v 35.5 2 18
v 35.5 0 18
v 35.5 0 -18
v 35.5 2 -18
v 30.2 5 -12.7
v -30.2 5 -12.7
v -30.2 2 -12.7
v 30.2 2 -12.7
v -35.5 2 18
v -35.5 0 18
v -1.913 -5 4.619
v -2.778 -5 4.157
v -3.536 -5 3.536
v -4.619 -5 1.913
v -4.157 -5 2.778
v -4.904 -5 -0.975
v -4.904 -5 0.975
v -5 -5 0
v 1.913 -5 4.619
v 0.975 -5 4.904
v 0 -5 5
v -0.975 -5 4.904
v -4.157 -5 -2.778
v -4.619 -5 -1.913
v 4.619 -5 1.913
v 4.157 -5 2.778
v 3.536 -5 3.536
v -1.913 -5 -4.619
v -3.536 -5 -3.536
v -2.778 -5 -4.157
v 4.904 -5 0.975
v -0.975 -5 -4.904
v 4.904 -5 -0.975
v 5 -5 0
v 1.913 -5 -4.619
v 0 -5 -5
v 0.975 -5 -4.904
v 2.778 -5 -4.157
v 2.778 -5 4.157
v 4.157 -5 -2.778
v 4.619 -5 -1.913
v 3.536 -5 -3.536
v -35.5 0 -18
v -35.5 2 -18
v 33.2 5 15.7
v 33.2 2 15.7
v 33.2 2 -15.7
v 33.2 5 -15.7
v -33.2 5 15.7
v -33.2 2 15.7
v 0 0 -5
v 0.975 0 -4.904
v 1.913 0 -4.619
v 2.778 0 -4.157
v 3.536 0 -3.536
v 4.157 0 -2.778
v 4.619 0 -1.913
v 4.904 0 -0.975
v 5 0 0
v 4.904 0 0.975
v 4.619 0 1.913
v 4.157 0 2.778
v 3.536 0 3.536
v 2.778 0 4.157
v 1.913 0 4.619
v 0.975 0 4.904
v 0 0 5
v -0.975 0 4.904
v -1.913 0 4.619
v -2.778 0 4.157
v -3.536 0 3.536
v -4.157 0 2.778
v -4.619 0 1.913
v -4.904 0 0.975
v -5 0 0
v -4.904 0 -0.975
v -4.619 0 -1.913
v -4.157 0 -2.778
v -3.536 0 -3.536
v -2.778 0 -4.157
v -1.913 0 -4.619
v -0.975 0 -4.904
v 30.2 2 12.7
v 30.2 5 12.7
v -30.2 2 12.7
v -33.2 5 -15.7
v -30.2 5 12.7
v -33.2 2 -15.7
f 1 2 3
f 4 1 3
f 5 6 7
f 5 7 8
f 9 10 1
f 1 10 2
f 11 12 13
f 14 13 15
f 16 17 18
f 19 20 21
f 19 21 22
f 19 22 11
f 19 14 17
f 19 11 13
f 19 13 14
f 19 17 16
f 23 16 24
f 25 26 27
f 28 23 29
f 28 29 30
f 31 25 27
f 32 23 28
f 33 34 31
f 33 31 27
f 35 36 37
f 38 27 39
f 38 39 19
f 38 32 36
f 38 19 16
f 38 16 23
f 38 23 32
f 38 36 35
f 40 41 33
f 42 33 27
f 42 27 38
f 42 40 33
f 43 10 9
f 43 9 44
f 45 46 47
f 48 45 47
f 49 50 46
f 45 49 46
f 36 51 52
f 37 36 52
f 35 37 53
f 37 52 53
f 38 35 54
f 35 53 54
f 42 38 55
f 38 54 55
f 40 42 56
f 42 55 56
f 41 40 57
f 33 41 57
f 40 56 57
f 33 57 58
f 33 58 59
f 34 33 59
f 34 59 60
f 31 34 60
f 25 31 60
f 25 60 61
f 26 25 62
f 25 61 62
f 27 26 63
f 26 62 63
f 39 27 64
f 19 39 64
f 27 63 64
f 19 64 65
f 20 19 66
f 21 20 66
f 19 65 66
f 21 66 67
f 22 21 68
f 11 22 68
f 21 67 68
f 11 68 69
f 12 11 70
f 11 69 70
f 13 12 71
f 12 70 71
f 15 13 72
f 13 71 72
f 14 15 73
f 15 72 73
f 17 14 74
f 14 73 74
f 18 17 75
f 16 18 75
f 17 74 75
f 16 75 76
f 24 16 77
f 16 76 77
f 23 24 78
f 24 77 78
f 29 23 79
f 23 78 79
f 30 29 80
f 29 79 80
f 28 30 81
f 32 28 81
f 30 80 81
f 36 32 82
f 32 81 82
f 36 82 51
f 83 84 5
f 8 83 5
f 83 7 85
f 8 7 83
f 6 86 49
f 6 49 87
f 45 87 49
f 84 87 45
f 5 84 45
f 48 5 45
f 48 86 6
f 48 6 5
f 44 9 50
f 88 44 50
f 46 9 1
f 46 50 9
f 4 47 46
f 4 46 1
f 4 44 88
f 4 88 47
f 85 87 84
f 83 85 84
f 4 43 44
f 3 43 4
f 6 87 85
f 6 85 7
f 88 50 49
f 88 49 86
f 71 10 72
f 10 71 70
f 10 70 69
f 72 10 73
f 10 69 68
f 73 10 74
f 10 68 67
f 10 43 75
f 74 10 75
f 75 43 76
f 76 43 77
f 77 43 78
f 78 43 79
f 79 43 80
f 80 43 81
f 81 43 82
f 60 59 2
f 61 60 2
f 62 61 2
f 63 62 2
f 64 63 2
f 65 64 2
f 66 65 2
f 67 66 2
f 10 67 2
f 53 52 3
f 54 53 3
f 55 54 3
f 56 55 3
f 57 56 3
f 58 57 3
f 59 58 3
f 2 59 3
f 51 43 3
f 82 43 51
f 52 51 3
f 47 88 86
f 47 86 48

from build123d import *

# Parameters (mm, degrees)
SCHIZZO1_W                   = 71
SCHIZZO1_H                   = 36
ESTRUSIONE_ESTRUSIONE1_DEPTH = 2
SCHIZZO2_W                   = 66.4
SCHIZZO2_H                   = 31.4
ESTRUSIONE_ESTRUSIONE2_DEPTH = 3
SCHIZZO3_R                   = 5
ESTRUSIONE_ESTRUSIONE3_DEPTH = 5
SCHIZZO4_W                   = 60.4
SCHIZZO4_H                   = 25.4
TAGLIO_ESTRUSIONE1_DEPTH     = 3


with BuildPart() as part:
    # Schizzo1 → Estrusione-Estrusione1 (new body)
    with BuildSketch(Plane(origin=(0, 0, 0), x_dir=(1, 0, 0), z_dir=(0, 1, 0))):
        Rectangle(SCHIZZO1_W, SCHIZZO1_H)
    extrude(amount=ESTRUSIONE_ESTRUSIONE1_DEPTH)

    # Schizzo2 → Estrusione-Estrusione2 (add)
    with BuildSketch(Plane(origin=(0, 2, 0), x_dir=(1, 0, 0), z_dir=(0, 1, 0))):
        Rectangle(SCHIZZO2_W, SCHIZZO2_H)
    extrude(amount=ESTRUSIONE_ESTRUSIONE2_DEPTH)

    # Schizzo3 → Estrusione-Estrusione3 (add)
    with BuildSketch(Plane.XZ):
        with Locations(Location((0, 0, 0), (0, 0, 270))):
            Circle(SCHIZZO3_R)
    extrude(amount=ESTRUSIONE_ESTRUSIONE3_DEPTH)

    # Schizzo4 → Taglio-Estrusione1 (cut)
    with BuildSketch(Plane(origin=(0, 5, 0), x_dir=(1, 0, 0), z_dir=(0, 1, 0))):
        Rectangle(SCHIZZO4_W, SCHIZZO4_H)
    extrude(amount=-TAGLIO_ESTRUSIONE1_DEPTH, mode=Mode.SUBTRACT)


solid = part.part
